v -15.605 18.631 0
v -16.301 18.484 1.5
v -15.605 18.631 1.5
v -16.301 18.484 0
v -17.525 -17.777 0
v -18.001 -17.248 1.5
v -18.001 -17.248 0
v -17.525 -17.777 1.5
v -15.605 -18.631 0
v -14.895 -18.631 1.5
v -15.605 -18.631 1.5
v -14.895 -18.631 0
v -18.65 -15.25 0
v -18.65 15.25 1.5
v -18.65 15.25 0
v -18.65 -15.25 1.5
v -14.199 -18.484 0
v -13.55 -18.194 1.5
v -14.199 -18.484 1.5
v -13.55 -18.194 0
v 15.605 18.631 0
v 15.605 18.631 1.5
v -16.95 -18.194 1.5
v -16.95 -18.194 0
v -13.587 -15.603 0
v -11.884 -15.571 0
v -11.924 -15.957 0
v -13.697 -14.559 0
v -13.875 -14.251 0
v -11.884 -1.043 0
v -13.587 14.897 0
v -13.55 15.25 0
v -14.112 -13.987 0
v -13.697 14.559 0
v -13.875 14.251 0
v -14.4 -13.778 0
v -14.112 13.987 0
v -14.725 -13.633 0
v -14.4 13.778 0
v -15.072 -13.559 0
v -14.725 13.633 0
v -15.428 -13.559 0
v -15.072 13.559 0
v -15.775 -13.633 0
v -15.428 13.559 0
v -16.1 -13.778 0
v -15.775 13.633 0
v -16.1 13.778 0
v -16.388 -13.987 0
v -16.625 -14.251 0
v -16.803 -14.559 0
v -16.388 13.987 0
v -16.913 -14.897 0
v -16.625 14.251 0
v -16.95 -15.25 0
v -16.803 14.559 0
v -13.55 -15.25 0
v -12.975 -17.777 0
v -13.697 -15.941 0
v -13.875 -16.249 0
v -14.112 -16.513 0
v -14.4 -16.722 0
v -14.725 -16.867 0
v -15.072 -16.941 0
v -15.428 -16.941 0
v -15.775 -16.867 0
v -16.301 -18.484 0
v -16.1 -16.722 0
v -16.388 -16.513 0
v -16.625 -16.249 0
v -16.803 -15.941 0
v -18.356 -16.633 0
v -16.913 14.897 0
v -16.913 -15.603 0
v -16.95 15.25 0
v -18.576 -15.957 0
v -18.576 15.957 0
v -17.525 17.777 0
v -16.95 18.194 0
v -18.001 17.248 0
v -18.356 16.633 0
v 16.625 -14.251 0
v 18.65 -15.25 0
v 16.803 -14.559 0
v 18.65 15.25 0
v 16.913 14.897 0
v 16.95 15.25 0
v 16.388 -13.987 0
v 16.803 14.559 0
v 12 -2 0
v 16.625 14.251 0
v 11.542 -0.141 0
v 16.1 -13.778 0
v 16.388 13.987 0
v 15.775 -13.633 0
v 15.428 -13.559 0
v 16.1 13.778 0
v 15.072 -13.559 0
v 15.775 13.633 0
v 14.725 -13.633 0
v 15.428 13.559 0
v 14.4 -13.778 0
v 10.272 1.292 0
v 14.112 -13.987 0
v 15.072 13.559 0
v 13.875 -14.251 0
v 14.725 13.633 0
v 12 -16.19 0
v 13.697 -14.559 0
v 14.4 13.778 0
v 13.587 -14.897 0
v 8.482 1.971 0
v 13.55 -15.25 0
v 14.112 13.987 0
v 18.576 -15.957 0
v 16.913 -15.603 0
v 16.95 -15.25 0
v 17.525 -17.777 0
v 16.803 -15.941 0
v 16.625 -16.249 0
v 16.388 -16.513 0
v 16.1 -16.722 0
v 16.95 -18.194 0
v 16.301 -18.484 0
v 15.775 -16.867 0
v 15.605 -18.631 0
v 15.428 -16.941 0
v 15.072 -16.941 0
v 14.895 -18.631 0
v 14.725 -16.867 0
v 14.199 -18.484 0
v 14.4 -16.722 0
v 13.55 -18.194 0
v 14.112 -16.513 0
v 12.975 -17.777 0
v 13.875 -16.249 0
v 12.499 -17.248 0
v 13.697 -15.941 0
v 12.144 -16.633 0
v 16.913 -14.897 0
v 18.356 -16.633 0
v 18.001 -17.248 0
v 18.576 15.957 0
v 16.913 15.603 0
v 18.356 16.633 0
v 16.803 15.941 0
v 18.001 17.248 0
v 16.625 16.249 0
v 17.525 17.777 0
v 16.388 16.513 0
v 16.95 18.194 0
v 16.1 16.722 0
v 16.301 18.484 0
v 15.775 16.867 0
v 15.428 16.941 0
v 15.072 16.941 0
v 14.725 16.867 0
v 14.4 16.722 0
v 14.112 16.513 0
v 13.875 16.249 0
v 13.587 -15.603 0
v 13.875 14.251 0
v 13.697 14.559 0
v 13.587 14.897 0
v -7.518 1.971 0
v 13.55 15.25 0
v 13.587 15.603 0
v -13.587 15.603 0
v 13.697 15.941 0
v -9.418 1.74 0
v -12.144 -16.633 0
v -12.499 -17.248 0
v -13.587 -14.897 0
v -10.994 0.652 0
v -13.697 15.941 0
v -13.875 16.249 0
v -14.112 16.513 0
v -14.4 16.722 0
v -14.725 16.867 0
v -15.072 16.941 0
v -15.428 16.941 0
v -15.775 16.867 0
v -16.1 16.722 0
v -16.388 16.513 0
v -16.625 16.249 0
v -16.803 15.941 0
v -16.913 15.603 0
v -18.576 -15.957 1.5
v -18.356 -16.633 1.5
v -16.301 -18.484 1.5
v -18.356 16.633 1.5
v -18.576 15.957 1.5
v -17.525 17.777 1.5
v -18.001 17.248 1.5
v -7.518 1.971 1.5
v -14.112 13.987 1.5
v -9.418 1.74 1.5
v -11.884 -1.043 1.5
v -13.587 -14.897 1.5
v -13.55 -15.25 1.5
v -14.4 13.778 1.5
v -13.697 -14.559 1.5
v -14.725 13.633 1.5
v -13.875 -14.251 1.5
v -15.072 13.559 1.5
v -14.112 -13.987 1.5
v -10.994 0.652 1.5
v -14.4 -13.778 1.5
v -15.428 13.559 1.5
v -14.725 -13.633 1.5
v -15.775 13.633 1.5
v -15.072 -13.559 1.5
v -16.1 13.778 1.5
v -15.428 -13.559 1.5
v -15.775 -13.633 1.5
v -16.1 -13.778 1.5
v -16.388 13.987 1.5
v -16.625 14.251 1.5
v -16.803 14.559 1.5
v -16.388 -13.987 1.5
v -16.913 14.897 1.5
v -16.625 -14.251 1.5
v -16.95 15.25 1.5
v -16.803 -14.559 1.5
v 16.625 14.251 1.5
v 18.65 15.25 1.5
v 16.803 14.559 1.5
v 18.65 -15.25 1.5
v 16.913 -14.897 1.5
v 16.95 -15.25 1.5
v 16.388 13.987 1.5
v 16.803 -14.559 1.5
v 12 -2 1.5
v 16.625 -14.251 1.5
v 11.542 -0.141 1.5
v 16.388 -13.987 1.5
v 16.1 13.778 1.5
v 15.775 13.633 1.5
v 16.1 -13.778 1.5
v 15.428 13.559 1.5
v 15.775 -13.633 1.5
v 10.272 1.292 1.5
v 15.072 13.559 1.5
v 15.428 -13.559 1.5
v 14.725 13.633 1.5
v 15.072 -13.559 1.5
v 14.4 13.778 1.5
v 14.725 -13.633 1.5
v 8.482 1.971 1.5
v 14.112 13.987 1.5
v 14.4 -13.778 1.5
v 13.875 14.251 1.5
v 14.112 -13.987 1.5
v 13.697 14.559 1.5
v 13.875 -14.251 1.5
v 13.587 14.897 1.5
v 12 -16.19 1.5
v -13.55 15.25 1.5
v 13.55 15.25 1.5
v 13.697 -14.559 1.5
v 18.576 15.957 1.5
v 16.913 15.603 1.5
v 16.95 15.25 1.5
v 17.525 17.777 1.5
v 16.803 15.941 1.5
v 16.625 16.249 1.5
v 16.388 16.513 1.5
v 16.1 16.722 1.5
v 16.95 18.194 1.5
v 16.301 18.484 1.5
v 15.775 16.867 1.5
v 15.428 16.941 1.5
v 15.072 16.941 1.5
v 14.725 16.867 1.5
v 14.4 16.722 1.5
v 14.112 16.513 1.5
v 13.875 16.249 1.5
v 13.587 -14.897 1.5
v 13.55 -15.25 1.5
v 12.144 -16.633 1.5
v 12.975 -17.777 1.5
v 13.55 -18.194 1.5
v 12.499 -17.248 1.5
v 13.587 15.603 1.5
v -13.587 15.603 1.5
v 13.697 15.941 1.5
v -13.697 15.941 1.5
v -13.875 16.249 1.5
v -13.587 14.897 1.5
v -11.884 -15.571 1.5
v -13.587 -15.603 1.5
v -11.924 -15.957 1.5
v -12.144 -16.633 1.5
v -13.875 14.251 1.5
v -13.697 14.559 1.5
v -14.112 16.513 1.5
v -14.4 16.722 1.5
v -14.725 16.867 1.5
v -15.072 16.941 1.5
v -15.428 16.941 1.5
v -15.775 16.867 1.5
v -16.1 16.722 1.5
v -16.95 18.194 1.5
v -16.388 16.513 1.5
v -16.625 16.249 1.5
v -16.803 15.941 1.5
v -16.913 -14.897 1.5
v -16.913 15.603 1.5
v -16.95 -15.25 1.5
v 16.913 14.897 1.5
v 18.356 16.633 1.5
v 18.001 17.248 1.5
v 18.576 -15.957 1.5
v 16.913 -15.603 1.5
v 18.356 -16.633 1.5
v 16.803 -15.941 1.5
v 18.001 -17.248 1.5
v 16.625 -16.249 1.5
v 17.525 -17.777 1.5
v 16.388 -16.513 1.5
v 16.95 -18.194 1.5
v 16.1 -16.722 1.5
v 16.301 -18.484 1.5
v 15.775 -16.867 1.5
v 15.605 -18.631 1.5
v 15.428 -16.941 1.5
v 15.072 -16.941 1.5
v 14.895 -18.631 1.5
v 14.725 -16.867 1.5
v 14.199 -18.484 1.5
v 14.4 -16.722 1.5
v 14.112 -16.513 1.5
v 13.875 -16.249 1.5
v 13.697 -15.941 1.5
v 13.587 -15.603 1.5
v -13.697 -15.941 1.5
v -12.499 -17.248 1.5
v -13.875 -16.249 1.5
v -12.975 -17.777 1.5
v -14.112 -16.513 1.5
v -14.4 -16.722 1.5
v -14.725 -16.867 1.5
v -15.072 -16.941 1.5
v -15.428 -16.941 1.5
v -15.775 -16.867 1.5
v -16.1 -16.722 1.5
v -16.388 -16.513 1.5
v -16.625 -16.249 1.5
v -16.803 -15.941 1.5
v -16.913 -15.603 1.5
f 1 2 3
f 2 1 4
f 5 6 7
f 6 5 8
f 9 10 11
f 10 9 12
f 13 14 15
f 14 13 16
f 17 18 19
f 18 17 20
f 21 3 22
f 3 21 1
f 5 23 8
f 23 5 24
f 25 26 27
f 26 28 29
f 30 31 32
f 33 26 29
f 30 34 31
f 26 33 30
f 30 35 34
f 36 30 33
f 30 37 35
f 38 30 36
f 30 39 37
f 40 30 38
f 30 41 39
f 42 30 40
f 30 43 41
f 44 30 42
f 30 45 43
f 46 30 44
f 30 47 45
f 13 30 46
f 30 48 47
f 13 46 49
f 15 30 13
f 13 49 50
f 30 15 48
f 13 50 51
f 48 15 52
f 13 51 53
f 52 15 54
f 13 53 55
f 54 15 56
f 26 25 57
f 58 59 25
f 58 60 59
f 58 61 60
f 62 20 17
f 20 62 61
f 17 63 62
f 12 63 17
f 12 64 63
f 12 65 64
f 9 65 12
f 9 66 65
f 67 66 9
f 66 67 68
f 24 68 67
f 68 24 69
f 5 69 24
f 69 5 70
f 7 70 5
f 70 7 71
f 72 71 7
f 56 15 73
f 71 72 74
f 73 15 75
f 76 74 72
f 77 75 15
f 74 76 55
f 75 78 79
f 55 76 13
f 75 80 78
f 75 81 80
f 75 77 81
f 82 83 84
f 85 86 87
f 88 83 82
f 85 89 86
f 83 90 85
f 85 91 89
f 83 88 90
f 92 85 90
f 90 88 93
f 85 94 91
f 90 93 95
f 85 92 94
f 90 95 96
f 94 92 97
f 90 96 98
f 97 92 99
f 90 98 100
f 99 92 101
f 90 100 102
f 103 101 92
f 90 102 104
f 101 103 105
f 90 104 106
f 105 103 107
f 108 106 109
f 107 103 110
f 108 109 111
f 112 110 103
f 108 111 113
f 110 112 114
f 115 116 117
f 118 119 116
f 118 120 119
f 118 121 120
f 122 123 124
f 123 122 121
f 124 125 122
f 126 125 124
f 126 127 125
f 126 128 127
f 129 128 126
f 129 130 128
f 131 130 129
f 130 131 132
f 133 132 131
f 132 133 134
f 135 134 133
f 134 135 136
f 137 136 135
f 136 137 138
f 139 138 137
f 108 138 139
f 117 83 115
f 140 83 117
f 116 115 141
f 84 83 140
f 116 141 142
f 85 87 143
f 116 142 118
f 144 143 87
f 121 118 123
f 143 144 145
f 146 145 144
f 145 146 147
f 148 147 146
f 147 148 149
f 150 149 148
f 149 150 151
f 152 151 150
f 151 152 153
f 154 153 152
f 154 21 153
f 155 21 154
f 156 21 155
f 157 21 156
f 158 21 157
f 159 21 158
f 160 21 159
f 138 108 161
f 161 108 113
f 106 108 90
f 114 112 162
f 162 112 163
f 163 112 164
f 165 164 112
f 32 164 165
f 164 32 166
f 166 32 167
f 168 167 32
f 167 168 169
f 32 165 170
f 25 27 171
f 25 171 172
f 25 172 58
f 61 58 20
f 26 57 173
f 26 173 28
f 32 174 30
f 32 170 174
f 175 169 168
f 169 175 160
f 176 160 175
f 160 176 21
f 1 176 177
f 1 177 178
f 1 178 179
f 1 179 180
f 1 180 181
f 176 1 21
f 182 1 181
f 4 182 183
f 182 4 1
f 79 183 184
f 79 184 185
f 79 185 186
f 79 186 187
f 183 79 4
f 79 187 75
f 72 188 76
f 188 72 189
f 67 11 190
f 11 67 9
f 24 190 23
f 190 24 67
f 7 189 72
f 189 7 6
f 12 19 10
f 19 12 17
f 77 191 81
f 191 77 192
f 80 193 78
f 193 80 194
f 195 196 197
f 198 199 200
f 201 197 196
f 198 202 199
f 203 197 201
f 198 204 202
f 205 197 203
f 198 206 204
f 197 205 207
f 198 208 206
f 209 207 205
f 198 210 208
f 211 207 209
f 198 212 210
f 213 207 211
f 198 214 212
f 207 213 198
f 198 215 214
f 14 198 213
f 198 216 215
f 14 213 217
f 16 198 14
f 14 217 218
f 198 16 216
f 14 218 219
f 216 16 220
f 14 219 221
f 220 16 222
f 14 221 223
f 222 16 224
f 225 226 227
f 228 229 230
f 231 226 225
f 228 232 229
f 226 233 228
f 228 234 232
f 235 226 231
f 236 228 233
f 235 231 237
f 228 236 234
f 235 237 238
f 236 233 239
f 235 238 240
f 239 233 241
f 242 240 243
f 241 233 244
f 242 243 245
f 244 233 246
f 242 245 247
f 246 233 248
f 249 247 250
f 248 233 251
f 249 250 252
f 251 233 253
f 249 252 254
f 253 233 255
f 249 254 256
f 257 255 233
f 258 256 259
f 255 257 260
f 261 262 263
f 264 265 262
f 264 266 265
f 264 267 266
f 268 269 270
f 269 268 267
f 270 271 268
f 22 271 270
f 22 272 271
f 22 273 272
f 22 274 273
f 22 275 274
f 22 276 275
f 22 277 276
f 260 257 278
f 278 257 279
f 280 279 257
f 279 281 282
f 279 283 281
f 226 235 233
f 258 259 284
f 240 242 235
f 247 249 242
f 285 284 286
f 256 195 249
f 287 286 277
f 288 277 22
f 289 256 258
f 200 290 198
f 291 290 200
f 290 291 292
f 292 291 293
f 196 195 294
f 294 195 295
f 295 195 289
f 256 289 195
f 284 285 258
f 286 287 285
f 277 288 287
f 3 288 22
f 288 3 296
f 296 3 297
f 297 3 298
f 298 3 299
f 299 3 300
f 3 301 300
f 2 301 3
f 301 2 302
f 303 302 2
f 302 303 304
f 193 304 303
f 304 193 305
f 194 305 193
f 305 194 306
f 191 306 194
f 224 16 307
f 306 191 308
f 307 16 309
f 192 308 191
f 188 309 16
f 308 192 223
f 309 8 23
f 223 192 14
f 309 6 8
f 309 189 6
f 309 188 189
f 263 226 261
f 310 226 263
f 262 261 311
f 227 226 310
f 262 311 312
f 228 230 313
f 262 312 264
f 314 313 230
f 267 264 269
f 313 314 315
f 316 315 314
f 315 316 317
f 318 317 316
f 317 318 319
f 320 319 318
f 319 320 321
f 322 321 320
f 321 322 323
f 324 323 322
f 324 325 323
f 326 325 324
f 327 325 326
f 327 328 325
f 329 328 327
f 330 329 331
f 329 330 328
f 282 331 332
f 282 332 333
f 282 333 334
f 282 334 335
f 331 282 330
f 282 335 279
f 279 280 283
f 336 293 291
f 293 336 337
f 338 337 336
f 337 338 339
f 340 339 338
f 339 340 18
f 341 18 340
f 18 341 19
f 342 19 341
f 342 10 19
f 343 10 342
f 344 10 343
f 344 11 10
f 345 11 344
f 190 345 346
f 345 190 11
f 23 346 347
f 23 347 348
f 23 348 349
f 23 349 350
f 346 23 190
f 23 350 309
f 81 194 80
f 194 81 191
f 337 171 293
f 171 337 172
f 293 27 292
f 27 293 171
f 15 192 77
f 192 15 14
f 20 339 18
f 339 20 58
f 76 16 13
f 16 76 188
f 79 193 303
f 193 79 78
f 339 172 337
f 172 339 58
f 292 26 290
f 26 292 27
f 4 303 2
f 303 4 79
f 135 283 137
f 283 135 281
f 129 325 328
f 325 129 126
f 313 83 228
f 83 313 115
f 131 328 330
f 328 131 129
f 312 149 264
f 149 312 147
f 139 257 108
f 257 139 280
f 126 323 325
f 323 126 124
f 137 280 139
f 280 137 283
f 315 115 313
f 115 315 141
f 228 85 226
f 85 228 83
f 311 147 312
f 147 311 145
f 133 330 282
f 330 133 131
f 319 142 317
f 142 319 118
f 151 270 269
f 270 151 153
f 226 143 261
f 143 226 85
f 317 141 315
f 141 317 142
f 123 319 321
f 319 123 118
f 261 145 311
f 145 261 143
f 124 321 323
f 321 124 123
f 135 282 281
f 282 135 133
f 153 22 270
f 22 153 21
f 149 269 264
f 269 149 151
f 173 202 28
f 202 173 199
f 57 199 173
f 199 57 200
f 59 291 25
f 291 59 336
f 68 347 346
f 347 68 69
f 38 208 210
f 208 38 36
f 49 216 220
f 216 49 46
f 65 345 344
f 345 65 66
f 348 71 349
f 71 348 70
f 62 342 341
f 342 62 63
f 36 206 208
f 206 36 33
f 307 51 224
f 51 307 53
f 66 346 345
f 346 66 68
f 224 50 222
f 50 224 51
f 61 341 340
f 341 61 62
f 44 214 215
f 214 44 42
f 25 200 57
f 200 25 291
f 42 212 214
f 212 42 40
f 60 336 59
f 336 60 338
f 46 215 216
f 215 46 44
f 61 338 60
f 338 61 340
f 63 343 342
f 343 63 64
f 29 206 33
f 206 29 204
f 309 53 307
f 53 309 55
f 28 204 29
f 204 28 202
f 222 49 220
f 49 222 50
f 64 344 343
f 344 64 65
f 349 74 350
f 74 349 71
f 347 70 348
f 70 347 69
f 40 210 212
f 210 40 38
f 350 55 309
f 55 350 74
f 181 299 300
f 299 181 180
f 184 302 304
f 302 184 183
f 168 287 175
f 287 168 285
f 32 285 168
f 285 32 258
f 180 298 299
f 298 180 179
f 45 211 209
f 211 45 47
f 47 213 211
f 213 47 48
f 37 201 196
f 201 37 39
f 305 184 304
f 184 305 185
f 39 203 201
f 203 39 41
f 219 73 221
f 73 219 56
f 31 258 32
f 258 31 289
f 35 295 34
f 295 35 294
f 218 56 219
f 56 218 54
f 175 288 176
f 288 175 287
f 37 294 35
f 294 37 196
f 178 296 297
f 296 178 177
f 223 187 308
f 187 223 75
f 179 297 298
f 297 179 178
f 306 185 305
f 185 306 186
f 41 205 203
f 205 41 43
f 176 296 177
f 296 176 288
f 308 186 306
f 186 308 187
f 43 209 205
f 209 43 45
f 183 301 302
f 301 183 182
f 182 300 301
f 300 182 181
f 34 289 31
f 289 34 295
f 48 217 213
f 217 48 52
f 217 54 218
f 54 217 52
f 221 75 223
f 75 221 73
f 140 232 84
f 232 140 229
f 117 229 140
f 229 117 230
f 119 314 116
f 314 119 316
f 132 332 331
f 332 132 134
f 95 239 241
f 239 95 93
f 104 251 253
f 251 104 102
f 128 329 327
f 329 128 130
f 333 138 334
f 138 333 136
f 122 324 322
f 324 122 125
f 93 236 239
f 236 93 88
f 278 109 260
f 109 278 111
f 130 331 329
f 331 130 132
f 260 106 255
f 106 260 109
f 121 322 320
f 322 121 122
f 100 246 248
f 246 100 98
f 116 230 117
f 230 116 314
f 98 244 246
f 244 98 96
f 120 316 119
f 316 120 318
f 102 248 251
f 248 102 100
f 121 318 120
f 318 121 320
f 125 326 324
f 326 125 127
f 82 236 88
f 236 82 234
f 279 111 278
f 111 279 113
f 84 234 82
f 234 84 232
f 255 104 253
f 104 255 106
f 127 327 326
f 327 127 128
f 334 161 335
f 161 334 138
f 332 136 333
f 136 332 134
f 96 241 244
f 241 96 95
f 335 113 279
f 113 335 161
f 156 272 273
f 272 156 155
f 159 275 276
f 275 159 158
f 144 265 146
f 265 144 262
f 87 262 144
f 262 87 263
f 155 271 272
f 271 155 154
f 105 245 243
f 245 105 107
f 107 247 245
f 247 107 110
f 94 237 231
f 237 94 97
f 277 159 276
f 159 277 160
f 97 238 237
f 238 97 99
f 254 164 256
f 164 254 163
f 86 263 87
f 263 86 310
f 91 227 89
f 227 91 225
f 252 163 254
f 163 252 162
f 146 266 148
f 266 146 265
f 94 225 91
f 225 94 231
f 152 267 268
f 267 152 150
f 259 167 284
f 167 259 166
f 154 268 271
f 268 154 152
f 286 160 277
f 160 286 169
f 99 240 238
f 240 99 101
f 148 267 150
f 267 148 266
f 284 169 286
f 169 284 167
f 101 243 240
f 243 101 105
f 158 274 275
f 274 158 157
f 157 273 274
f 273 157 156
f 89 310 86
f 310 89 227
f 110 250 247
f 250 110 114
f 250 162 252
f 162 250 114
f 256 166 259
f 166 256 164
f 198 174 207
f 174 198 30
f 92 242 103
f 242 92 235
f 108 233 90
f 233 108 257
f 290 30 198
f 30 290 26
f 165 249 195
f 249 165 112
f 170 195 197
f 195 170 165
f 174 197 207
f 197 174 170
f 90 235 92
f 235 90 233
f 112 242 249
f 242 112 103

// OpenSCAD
// file: dronePlates.scad
/**
 * dronePlates.scad
 * Plate library
 *
 * GNU GPL V3
 * @author: Victor Potenciano
 */

m3Rad = 3.4/2;
cornerR = 4;

/**
 *
 */
module helperDisk(diameter) {
	cylinder(r = diameter/2, h = 0.6, $fn=20);
}

/**
 *
 */
module roundedRect(size, radius) {
	x = size[0];
	y = size[1];
	z = size[2];

	linear_extrude(height=z)
	hull() {
	// place 4 circles in the corners, with the given radius
	translate([(-x/2)+(radius/2), (-y/2)+(radius/2), 0]){ circle(r=radius); }
	translate([(x/2)-(radius/2), (-y/2)+(radius/2), 0]){ circle(r=radius); }
	translate([(-x/2)+(radius/2), (y/2)-(radius/2), 0]){ circle(r=radius); }
	translate([(x/2)-(radius/2), (y/2)-(radius/2), 0]){ circle(r=radius); }
	}
}

/**
 * rounded rectangle triangle with corner at origin
 */
module roundedTriangle(size, radius) {
	x = size[0];
	y = size[1];
	z = size[2];

	linear_extrude(height=z)
	hull() {
	translate([radius, radius, 0]){ circle(r=radius); }
	translate([x-radius, radius, 0]){ circle(r=radius); }
	translate([radius, y-radius, 0]){ circle(r=radius); }
	}
}

/**
 *
 */
module roundRectPlate(w, l, plateThick=3) {
	difference(){
		roundedRect([l+m3Rad*1.75,w+m3Rad*1.75,plateThick], cornerR);
		translate([l/2, w/2, -0.5]) { cylinder(h = plateThick+1, r = m3Rad, $fn=30); }
		translate([-l/2, w/2, -0.5]) { cylinder(h = plateThick+1, r = m3Rad, $fn=30); }
		translate([l/2, -w/2, -0.5]) { cylinder(h = plateThick+1, r = m3Rad, $fn=30); }
		translate([-l/2, -w/2, -0.5]) { cylinder(h = plateThick+1, r = m3Rad, $fn=30); }
	}
}

/**
 *
 */
module crossSquarePlate(l, thick=3) {
	inDist = cornerR*2+4;
	trianL = sqrt((l*l)/2)-inDist;
	centerR = 4;

	difference(){
		roundRectPlate(l, l, thick);
		translate([0, centerR, -0.5]) { 
			rotate([0,0,45]){ roundedTriangle([trianL,trianL,thick+1], cornerR-2); }
		}
		translate([0, -centerR, -0.5]) { 
			rotate([0,0,225]){ roundedTriangle([trianL,trianL,thick+1], cornerR-2); }
		}
		translate([-centerR, 0, -0.5]) { 
			rotate([0,0,135]){ roundedTriangle([trianL,trianL,thick+1], cornerR-2); }
		}
		translate([centerR, 0, -0.5]) { 
			rotate([0,0,-45]){ roundedTriangle([trianL,trianL,thick+1], cornerR-2); }
		}
	}
}

/**
 *
 */
module hShapePlate(w, l, thick=4) {
	inDist = cornerR*2+1;

	difference(){
		roundRectPlate(w, l, thick);
		translate([0, w/4, -0.5]) { roundedRect([l-inDist,w/2-inDist,thick+1], cornerR-2); }
		translate([0, -w/4, -0.5]) { roundedRect([l-inDist,w/2-inDist,thick+1], cornerR-2); }
	}
}

/**
 *
 */
module motorCircleMount(inDia, outDia, thick=3, extraH=false, d1=19, d2=16, holeR=m3Rad ) {
	difference(){
		cylinder(h = thick, r = outDia/2, $fn=30);
		motorCircleMountHoles(inDia, outDia, thick, extraH, d1=d1, d2=d2, holeR=holeR);
	}
}

/**
 *
 */
module motorCircleMountHoles(inDia, outDia, thick=3, extraH=false, d1=19, d2=16, d3=25, holeR=m3Rad) {
	translate([0, 0, -0.5]) { cylinder(h = thick+1, r = inDia/2, $fn=30); }

	for(i=[0:3]) {
		rotate([0,0,90*i]){
		translate([d1/2, 0, -0.5]) cylinder(h = thick+1, r = holeR, $fn=20);
		translate([d2/2, 0, -0.5]) cylinder(h = thick+1, r = holeR, $fn=20);
		translate([d2/2, -holeR, -0.5]) cube(size = [(d1-d2)/2,holeR*2,thick+1]);
		}
	}
	
	if(extraH==true){	
		for(i=[-1,1]) translate([i*d3/2, 0, -0.5]) { cylinder(h = thick+1, r = holeR, $fn=30); }
	}
}

/**
 *
 */
module motorRectMount(w, l, inDia, thick=3) {
	d1=19;
	d2=16;

	difference(){
		roundRectPlate(w, l, thick);
		translate([0, 0, -0.5]) { cylinder(h = thick+1, r = inDia/2, $fn=30); }
		translate([0, d1/2, -0.5]) { cylinder(h = thick+1, r = m3Rad, $fn=30); }
		translate([0, -d1/2, -0.5]) { cylinder(h = thick+1, r = m3Rad, $fn=30); }
		translate([d2/2, 0, -0.5]) { cylinder(h = thick+1, r = m3Rad, $fn=30); }
		translate([-d2/2, 0, -0.5]) { cylinder(h = thick+1, r = m3Rad, $fn=30); }
	}
}

/**
 *
 */
module tube(inDia, outDia, height) {
	difference(){
		cylinder(h = height, r = outDia/2, $fn=50);
		translate([0, 0, -0.5]) { cylinder(h = height+1, r = inDia/2, $fn=30); }
	}
}

/**
 *
 */
module squareTube(inDia, outDia, height) {
	translate([0,0,height/2]){
	difference(){
		cube(size = [outDia,outDia,height], center = true);
		cube(size = [inDia,inDia,height+1], center = true);
	}
	}
}

/**
 *
 */
module djiFlamewheelHoles(height) {
	a = 23;
	b = 16;
	c = 19.5;
	
	translate([a/2, c/2, 0]) { cylinder(h = height, r = m3Rad, $fn=30); }
	translate([-a/2, c/2, 0]) { cylinder(h = height, r = m3Rad, $fn=30); }
	translate([b/2, -c/2, 0]) { cylinder(h = height, r = m3Rad, $fn=30); }
	translate([-b/2, -c/2, 0]) { cylinder(h = height, r = m3Rad, $fn=30); }
}

/**
 *
 */
module djiFlamewheelHolesBotton(height) {
	a1 = 21;
	c = 19.5;
	
	translate([a1/2, c/2, 0]) { cylinder(h = height, r = m3Rad, $fn=30); }
	translate([-a1/2, c/2, 0]) { cylinder(h = height, r = m3Rad, $fn=30); }
}

/**
 *
 */
module propeller(size){
union(){
difference(){
	cylinder(h = 3, r = size/2, center=true, $fn=30);
	cylinder(h = 3.1, r = size/2-2, center=true, $fn=30); 
}
for( i = [-1,1] ){
rotate([0,0,45*i]){ cube(size = [size,4,1], center = true); }
}
}
}

/**
 *
 */
module slot(length, height, rad){
for(i=[-1,1]) translate([i*length/2,0,0]) cylinder(h = height, r = rad, $fn=30);
translate([0,0,height/2]) cube(size = [length,rad*2,height], center = true);
}

 

////////////////////////
// Examples:
////////////////////////

motorCircleMount(8, 25, 3.5);

//roundedRect([50,50,3], 4);

//hShapePlate(79, 25);

//rotate([0,0,45]){roundedTriangle([40,40,3], 4);}

//crossSquarePlate(45, 4);

/*
union(){
motorRectMount(21, 18, 8, 4);
translate([9, 10.5, 0]) {tube(m3Rad*2, 6.5, 6);}
}
*/

/*
difference(){
union(){
hShapePlate(50, 30, 3.5);
translate([-4,-25,0]){cube(size = [8,50,3.5]);}
rotate([0, 0, 45]) {motorCircleMount(8, 35, 3.5);}
}
cylinder(h = 10, r = 4, $fn=100, center=true);
}
*/

//rotate([90,0,0]){ tube(5,10,20); }
//translate([20,0,0]){ squareTube(5, 10, 20); }
// main file
/**
 * lrc race X internal plate
 */
 
use <dronePlates.scad>;

thick = 1.5;
holeDst = 30.5;
m3Rad = 3.4/2;

difference(){
    union(){
        for(i=[-1,1]){
            hull(){
                for(j=[-1,1]){
                    translate([i*holeDst/2, j*holeDst/2, 0])
                    cylinder(r=m3Rad*2, h=thick, $fn=30);
                }
            }
        }
        hull(){
        for(i=[-1,1]){
            for(j=[0,1]){
                translate([i*holeDst/2, j*holeDst/2, 0])
                cylinder(r=m3Rad*2, h=thick, $fn=30);
            }
        }
        }
    }

for(i=[-1,1]){
    for(j=[-1,1]){
        translate([i*holeDst/2, j*holeDst/2, -0.5])
        cylinder(r=m3Rad, h=thick+1, $fn=30);
    }
}

translate([0,-15,-0.5]) {
    roundedRect([20,30,thick+1], 4);
}
}
